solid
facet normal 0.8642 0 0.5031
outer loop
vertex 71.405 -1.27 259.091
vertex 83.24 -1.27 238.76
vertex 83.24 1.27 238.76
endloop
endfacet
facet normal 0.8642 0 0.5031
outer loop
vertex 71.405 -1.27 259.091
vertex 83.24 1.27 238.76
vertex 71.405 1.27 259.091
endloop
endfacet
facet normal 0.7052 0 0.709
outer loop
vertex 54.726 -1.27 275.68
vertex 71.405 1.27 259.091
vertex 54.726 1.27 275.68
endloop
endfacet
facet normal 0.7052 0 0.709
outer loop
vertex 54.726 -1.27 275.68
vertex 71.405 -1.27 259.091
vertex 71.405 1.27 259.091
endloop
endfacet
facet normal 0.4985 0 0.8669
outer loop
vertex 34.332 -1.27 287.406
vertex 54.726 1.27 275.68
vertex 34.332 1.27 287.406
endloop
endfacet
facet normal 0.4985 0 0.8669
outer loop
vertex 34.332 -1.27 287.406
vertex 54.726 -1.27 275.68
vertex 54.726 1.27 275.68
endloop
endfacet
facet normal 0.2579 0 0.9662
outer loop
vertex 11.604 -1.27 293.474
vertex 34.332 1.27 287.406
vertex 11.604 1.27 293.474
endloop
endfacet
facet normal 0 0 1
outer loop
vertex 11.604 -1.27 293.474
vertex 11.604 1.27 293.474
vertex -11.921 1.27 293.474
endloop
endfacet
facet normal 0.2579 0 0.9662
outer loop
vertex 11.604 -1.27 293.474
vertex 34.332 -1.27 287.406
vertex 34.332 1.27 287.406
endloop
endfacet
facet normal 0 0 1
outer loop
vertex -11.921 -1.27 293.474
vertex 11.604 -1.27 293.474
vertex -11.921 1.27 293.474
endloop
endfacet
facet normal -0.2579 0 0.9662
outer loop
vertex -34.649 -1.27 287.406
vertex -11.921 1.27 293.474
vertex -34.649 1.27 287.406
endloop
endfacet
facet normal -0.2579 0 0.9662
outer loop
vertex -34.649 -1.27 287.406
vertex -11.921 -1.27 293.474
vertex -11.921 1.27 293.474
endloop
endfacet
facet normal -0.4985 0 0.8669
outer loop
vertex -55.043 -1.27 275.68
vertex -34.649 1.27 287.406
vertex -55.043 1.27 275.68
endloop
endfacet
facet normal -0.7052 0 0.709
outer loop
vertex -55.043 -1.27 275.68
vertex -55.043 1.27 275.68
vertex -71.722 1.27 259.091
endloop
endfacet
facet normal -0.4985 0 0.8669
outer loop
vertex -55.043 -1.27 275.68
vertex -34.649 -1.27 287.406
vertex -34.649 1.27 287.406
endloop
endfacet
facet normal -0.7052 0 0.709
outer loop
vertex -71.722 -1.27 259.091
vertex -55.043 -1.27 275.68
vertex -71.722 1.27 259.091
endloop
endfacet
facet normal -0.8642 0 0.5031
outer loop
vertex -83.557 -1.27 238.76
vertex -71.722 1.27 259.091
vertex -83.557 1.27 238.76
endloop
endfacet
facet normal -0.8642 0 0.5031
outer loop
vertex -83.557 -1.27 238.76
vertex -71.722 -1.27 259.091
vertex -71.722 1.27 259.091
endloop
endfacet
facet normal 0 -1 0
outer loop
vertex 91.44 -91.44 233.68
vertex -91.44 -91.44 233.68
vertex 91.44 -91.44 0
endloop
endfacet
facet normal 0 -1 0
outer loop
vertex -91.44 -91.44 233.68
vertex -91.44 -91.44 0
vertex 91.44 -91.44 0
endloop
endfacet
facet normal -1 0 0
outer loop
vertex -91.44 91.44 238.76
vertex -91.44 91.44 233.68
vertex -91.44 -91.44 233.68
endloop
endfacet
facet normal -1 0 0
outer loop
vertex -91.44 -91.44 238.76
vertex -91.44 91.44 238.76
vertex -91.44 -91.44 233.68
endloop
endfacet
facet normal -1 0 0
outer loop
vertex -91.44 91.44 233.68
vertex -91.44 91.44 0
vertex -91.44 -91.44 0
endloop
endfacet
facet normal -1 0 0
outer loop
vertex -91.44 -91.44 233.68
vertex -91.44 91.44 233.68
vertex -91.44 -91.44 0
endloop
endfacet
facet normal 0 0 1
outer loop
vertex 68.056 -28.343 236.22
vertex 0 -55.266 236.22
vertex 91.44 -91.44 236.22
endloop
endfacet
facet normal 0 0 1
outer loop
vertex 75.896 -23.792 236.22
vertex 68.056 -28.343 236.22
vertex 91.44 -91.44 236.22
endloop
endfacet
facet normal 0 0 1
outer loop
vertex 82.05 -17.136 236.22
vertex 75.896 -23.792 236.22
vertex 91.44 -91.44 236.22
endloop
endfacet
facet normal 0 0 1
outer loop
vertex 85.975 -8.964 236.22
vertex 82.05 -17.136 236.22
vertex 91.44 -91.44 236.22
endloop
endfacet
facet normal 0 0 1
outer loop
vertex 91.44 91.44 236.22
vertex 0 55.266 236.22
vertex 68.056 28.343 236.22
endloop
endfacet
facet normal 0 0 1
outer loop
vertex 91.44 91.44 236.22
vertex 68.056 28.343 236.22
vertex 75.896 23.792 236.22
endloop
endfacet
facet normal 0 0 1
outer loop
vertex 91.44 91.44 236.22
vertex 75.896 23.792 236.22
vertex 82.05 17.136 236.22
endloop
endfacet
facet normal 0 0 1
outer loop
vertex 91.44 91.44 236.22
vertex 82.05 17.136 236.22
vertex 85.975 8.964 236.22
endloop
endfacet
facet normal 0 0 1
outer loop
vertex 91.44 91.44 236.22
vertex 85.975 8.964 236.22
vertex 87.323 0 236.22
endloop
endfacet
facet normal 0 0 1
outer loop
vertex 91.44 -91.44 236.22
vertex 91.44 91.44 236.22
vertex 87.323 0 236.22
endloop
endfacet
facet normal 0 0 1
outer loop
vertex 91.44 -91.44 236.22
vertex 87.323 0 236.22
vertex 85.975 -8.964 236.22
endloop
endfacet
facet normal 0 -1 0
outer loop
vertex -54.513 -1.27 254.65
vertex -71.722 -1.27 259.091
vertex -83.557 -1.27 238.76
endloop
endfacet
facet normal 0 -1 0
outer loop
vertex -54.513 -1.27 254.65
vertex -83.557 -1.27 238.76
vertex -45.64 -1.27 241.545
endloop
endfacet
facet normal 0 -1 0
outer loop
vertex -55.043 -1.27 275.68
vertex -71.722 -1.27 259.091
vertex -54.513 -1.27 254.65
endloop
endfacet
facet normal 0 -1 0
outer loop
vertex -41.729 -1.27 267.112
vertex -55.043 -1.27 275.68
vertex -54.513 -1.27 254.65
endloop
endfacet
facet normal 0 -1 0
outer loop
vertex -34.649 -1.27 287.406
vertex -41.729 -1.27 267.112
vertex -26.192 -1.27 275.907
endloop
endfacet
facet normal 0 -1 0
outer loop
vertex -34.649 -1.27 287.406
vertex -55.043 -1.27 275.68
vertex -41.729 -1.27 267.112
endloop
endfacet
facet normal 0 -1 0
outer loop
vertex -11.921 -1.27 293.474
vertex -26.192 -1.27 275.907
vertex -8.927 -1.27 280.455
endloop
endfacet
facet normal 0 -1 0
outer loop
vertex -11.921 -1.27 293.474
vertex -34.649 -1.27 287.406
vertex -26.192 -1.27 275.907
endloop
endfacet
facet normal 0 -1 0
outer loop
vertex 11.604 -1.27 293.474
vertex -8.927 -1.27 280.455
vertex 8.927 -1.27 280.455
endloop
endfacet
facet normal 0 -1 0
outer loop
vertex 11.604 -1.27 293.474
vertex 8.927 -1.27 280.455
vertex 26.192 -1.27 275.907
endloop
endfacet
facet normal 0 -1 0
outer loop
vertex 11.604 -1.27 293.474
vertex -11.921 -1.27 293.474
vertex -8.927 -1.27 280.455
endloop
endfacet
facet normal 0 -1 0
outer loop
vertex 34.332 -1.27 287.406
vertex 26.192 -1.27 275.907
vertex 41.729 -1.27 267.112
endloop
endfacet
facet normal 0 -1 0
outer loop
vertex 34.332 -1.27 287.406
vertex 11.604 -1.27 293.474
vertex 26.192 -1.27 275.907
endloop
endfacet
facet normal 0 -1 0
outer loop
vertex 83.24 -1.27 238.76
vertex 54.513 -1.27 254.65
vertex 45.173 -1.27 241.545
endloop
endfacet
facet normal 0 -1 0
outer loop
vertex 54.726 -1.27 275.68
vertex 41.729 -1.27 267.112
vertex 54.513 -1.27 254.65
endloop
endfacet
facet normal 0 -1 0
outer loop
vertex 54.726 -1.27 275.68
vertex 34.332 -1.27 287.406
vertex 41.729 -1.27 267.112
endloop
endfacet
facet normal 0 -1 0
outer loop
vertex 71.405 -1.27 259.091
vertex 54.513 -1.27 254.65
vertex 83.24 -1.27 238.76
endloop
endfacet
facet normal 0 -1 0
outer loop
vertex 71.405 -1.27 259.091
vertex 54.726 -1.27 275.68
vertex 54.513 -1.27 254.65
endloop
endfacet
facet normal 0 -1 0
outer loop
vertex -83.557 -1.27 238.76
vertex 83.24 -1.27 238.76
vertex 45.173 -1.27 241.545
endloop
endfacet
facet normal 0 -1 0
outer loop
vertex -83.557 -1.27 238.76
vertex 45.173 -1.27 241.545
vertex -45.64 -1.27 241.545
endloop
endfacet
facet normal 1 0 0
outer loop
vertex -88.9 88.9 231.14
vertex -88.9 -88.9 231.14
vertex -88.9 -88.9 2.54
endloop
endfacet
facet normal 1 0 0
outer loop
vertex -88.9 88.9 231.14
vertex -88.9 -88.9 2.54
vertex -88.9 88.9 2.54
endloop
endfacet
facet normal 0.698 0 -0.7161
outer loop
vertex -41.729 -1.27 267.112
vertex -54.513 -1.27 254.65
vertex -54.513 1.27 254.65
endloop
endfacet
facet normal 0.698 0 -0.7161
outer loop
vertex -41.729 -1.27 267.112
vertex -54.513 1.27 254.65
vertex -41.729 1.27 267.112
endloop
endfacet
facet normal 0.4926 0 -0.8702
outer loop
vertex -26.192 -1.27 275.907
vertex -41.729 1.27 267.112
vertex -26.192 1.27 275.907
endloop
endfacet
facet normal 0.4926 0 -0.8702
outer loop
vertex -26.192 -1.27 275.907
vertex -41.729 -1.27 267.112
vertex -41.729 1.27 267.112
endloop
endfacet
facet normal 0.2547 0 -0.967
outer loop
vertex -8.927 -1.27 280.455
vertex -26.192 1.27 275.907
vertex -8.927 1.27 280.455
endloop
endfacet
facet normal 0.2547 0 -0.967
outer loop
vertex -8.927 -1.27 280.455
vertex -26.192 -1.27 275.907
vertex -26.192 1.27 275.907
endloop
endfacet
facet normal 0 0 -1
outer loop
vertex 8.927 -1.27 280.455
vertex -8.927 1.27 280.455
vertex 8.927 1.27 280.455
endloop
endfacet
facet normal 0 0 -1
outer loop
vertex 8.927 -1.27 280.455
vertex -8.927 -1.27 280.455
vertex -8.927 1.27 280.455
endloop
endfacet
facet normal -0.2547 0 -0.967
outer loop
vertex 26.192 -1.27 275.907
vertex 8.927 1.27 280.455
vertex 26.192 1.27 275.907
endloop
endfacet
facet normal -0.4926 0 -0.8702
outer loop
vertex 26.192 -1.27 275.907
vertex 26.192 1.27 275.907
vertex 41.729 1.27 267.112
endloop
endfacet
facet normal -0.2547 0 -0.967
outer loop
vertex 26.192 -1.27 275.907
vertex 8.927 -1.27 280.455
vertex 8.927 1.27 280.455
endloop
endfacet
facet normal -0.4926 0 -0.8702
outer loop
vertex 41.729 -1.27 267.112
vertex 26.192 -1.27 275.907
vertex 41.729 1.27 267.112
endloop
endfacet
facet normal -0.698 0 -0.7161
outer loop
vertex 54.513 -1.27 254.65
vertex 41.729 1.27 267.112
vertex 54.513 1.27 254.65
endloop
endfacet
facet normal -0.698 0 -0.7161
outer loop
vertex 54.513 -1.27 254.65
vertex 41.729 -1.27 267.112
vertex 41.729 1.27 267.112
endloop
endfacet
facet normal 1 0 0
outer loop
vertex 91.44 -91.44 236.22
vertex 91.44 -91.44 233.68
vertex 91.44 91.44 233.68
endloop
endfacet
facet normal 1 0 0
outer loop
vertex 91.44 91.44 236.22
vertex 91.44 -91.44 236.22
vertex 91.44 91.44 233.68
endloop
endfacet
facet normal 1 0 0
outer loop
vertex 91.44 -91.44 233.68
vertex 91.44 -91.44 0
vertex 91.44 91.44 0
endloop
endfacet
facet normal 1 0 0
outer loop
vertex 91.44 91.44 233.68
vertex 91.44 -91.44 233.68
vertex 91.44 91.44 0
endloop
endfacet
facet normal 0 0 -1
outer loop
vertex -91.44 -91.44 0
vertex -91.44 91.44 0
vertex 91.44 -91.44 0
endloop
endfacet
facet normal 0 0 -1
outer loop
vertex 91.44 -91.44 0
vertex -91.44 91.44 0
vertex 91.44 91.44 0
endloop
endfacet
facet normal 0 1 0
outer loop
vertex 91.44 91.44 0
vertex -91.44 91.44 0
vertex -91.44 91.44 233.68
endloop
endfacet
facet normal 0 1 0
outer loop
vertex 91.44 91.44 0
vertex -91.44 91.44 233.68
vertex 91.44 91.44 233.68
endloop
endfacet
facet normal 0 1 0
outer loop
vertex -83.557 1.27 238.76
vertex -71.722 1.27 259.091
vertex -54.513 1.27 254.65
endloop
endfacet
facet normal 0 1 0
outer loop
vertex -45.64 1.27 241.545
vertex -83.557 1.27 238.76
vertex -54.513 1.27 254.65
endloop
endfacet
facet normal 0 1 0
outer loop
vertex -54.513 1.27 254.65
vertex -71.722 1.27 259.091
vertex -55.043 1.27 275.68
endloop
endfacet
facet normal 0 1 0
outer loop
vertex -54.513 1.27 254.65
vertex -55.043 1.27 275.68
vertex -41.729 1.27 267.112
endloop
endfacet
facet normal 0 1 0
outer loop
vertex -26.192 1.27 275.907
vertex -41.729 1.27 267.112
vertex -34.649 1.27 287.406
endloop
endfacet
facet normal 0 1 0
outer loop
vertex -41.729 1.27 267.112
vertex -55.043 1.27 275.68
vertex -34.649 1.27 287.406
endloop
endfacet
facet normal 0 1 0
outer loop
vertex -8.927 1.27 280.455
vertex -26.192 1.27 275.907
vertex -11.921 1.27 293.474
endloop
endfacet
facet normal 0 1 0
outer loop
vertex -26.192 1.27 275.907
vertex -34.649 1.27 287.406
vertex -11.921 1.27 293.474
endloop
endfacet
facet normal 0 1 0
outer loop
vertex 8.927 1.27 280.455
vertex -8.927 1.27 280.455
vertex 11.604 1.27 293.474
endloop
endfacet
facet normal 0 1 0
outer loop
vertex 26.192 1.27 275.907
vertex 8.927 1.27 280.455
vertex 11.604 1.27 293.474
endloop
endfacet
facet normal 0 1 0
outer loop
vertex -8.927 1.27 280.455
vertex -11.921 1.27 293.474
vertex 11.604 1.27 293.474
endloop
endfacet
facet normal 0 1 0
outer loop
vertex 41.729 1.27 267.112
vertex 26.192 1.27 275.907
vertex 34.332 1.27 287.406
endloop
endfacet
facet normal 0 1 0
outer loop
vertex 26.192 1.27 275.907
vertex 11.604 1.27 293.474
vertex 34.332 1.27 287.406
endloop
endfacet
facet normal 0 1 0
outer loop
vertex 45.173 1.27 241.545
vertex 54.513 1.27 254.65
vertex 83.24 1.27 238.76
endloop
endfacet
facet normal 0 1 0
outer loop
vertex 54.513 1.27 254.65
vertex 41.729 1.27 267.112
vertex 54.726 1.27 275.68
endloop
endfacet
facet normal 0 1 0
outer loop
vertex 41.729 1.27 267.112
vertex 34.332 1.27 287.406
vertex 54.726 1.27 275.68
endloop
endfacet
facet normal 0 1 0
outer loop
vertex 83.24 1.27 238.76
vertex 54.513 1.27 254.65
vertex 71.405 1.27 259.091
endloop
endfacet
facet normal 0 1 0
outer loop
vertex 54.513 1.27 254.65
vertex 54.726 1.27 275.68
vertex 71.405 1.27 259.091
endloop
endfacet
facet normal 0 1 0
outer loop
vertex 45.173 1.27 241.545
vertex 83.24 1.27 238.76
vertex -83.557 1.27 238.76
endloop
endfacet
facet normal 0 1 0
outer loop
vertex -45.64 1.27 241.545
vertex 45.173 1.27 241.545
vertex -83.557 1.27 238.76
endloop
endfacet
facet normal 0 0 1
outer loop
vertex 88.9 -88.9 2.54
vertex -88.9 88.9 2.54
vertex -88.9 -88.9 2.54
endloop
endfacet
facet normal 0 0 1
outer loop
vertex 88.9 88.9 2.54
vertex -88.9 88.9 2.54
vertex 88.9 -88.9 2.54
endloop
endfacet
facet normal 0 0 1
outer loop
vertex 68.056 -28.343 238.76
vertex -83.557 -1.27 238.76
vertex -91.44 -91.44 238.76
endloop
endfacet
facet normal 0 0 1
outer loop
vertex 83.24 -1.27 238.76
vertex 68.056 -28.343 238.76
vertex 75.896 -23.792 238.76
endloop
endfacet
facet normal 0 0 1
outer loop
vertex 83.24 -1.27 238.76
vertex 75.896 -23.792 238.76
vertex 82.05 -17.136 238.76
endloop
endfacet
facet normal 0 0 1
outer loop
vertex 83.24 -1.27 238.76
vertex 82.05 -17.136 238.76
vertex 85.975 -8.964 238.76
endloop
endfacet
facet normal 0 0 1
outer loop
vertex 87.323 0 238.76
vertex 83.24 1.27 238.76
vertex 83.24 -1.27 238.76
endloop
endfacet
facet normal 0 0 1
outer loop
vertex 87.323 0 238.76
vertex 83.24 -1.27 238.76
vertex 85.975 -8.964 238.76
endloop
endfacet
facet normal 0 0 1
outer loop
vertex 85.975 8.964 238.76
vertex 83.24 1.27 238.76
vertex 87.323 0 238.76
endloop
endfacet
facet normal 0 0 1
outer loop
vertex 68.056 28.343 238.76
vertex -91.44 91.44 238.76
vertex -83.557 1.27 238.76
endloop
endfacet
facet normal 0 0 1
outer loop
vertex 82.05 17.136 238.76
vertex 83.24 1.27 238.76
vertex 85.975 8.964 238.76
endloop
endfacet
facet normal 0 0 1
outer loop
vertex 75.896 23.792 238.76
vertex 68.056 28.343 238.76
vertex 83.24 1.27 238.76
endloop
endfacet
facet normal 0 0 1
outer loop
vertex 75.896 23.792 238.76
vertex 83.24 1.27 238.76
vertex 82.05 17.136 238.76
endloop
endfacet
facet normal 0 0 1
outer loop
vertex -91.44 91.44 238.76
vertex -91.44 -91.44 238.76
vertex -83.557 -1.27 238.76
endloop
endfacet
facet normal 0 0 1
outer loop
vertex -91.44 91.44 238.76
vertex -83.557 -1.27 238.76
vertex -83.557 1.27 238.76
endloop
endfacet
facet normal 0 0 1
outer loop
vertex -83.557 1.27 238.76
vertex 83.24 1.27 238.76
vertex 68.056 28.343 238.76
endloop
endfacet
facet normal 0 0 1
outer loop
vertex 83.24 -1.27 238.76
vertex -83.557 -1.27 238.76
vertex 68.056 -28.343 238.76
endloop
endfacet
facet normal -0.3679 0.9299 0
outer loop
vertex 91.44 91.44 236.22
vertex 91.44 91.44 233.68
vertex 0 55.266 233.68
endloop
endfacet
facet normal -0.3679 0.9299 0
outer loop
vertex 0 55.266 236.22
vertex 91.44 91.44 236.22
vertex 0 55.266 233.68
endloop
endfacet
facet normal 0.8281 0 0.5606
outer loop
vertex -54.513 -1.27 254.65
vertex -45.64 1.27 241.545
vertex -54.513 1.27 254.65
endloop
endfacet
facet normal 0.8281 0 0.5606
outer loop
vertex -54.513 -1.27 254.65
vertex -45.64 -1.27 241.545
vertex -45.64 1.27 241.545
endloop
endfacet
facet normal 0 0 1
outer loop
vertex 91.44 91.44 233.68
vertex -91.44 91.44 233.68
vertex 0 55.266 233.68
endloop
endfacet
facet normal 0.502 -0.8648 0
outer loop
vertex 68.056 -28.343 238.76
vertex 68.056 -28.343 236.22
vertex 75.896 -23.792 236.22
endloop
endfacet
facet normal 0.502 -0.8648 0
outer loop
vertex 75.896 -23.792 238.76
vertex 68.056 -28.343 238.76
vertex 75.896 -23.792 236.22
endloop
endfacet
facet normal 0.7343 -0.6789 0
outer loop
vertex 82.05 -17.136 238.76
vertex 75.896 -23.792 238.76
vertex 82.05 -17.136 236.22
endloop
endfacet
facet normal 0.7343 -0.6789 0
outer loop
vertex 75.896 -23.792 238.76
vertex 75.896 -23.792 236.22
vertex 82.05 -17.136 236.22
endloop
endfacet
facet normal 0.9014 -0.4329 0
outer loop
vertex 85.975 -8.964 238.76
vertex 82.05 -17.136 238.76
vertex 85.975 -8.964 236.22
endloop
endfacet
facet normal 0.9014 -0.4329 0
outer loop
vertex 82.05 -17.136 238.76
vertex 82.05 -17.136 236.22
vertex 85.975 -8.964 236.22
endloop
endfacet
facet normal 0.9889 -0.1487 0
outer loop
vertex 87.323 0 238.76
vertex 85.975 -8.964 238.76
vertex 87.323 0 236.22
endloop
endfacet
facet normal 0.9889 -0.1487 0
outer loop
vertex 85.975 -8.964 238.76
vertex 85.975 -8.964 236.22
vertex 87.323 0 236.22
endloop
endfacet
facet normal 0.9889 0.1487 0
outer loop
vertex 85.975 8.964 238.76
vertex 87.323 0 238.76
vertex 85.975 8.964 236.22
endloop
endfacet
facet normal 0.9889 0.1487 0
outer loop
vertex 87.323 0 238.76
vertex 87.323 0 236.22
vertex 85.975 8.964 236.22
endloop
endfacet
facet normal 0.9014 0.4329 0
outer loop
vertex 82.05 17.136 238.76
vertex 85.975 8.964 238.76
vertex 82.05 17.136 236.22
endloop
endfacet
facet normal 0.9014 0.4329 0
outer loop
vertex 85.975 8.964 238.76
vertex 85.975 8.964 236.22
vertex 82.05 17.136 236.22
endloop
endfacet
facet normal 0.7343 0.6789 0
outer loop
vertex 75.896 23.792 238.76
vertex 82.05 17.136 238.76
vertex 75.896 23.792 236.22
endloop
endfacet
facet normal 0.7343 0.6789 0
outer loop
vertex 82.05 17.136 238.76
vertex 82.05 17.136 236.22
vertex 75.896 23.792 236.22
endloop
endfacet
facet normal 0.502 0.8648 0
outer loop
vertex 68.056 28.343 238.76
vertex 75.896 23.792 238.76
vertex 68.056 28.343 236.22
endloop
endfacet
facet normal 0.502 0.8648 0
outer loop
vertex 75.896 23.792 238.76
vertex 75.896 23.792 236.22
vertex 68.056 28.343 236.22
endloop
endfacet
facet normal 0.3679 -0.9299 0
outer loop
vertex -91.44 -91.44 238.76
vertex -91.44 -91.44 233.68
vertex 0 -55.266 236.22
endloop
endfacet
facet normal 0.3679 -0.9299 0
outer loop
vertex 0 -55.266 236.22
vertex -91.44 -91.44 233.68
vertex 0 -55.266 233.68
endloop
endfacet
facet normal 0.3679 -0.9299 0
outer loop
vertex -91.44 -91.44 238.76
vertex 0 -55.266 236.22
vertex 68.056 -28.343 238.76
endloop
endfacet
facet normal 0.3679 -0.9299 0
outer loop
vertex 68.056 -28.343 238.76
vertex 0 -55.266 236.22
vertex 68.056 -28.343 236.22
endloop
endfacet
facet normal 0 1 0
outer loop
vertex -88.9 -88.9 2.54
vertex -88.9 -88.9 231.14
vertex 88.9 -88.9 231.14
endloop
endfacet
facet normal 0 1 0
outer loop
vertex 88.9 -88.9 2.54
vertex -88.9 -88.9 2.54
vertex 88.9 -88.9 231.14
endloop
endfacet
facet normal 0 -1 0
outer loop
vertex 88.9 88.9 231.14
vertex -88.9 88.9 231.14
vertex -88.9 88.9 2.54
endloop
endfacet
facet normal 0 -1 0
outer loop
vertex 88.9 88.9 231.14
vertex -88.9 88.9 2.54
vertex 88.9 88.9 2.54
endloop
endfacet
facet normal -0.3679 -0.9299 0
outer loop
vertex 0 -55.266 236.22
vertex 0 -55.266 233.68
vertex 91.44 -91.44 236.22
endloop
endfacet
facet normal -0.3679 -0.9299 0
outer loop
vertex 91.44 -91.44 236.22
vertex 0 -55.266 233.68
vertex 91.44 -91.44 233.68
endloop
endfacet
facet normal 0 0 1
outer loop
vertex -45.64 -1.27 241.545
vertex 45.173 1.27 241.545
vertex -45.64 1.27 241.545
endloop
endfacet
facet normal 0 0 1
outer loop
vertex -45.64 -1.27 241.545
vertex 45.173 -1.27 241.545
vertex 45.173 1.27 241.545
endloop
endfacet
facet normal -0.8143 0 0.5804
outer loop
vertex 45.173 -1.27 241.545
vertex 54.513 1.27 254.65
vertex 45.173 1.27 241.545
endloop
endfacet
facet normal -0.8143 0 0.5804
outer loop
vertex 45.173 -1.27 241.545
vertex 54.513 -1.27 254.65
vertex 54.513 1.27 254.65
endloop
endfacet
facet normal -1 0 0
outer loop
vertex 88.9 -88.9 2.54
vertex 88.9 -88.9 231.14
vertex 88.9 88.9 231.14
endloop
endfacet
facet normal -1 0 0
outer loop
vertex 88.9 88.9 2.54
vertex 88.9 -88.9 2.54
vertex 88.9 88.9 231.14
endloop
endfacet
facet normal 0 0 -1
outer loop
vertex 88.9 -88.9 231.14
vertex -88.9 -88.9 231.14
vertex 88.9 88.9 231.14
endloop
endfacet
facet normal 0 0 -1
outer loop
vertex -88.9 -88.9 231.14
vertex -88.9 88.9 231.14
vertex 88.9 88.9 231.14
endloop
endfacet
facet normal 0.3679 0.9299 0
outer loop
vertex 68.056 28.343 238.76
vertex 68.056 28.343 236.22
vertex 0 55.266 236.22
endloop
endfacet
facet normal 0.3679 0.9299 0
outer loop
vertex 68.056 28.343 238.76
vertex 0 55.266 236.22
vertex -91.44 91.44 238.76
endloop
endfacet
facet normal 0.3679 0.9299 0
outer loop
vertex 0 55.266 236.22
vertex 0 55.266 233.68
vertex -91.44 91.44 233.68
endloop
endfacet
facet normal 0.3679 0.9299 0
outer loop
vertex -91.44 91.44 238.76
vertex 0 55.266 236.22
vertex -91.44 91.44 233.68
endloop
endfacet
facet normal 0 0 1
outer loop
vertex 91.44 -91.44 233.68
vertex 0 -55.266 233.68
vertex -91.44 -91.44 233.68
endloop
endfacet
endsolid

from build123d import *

# Parameters (mm, degrees)
F0_W      = 182.88
F0_H      = 182.88
F1_DEPTH  = 231.14
F2_T      = -2.54
F3_W      = 182.88
F3_H      = 182.88
F4_DEPTH  = 2.54
F6_DEPTH  = 2.54
F8_DEPTH  = 5.08
F10_DEPTH = 1.27


with BuildPart() as f1:
    # F0 (on Top) → F1 (new body)
    with BuildSketch(Plane.XY):
        Rectangle(F0_W, F0_H)
    extrude(amount=F1_DEPTH)

    # F2
    f2_openings = [f1.faces().sort_by_distance(p)[0] for p in [
        (0, 0, 231.14),
    ]]
    offset(amount=F2_T, openings=f2_openings)

    # F3 (on face) → F4 (join)
    with BuildSketch(Plane.XY.offset(231.14)):
        Rectangle(F3_W, F3_H)
    extrude(amount=F4_DEPTH)

    # F5 (on face) → F6 (join)
    with BuildSketch(Plane.XY.offset(233.68)):
        with BuildLine():
            Line((91.44, -91.44), (91.44, 91.44))
            Line((91.44, 91.44), (-68.0558882158, 28.342725541))
            ThreePointArc((-68.0558882158, 28.342725541), (-87.3233814083, 0), (-68.0558882158, -28.342725541))
            Line((-68.0558882158, -28.342725541), (91.44, -91.44))
        make_face()
    extrude(amount=F6_DEPTH)

    # F7 (on face) → F8 (join)
    with BuildSketch(Plane.XY.offset(233.68)):
        with BuildLine():
            Line((68.0558882158, 28.342725541), (-91.44, 91.44))
            Line((-91.44, 91.44), (-91.44, -91.44))
            Line((-91.44, -91.44), (68.0558882158, -28.342725541))
            ThreePointArc((68.0558882158, -28.342725541), (87.3233814083, 0), (68.0558882158, 28.342725541))
        make_face()
    extrude(amount=F8_DEPTH)

    # F9 (on Front) → F10 (join, symmetric)
    with BuildSketch(Plane.XZ):
        with BuildLine():
            Line((83.2395926118, 236.8696480989), (83.2395926118, 238.76))
            ThreePointArc((83.2395926118, 238.76), (-0.1585371792, 294.2423028387), (-83.5566669703, 238.76))
            Line((-83.5566669703, 238.76), (-83.6300104856, 236.8696480989))
            Line((-83.6300104856, 236.8696480989), (83.2395926118, 236.8696480989))
        make_face()
        with BuildLine():
            ThreePointArc((-54.5130875391, 254.6497191946), (0, 281.0305954441), (54.5130875391, 254.6497191946))
            Line((54.5130875391, 254.6497191946), (45.1730415225, 241.5446043015))
            Line((45.1730415225, 241.5446043015), (-45.6402897835, 241.5446043015))
            Line((-45.6402897835, 241.5446043015), (-54.5130875391, 254.6497191946))
        make_face(mode=Mode.SUBTRACT)
    extrude(amount=F10_DEPTH, both=True)


solid = f1.part
